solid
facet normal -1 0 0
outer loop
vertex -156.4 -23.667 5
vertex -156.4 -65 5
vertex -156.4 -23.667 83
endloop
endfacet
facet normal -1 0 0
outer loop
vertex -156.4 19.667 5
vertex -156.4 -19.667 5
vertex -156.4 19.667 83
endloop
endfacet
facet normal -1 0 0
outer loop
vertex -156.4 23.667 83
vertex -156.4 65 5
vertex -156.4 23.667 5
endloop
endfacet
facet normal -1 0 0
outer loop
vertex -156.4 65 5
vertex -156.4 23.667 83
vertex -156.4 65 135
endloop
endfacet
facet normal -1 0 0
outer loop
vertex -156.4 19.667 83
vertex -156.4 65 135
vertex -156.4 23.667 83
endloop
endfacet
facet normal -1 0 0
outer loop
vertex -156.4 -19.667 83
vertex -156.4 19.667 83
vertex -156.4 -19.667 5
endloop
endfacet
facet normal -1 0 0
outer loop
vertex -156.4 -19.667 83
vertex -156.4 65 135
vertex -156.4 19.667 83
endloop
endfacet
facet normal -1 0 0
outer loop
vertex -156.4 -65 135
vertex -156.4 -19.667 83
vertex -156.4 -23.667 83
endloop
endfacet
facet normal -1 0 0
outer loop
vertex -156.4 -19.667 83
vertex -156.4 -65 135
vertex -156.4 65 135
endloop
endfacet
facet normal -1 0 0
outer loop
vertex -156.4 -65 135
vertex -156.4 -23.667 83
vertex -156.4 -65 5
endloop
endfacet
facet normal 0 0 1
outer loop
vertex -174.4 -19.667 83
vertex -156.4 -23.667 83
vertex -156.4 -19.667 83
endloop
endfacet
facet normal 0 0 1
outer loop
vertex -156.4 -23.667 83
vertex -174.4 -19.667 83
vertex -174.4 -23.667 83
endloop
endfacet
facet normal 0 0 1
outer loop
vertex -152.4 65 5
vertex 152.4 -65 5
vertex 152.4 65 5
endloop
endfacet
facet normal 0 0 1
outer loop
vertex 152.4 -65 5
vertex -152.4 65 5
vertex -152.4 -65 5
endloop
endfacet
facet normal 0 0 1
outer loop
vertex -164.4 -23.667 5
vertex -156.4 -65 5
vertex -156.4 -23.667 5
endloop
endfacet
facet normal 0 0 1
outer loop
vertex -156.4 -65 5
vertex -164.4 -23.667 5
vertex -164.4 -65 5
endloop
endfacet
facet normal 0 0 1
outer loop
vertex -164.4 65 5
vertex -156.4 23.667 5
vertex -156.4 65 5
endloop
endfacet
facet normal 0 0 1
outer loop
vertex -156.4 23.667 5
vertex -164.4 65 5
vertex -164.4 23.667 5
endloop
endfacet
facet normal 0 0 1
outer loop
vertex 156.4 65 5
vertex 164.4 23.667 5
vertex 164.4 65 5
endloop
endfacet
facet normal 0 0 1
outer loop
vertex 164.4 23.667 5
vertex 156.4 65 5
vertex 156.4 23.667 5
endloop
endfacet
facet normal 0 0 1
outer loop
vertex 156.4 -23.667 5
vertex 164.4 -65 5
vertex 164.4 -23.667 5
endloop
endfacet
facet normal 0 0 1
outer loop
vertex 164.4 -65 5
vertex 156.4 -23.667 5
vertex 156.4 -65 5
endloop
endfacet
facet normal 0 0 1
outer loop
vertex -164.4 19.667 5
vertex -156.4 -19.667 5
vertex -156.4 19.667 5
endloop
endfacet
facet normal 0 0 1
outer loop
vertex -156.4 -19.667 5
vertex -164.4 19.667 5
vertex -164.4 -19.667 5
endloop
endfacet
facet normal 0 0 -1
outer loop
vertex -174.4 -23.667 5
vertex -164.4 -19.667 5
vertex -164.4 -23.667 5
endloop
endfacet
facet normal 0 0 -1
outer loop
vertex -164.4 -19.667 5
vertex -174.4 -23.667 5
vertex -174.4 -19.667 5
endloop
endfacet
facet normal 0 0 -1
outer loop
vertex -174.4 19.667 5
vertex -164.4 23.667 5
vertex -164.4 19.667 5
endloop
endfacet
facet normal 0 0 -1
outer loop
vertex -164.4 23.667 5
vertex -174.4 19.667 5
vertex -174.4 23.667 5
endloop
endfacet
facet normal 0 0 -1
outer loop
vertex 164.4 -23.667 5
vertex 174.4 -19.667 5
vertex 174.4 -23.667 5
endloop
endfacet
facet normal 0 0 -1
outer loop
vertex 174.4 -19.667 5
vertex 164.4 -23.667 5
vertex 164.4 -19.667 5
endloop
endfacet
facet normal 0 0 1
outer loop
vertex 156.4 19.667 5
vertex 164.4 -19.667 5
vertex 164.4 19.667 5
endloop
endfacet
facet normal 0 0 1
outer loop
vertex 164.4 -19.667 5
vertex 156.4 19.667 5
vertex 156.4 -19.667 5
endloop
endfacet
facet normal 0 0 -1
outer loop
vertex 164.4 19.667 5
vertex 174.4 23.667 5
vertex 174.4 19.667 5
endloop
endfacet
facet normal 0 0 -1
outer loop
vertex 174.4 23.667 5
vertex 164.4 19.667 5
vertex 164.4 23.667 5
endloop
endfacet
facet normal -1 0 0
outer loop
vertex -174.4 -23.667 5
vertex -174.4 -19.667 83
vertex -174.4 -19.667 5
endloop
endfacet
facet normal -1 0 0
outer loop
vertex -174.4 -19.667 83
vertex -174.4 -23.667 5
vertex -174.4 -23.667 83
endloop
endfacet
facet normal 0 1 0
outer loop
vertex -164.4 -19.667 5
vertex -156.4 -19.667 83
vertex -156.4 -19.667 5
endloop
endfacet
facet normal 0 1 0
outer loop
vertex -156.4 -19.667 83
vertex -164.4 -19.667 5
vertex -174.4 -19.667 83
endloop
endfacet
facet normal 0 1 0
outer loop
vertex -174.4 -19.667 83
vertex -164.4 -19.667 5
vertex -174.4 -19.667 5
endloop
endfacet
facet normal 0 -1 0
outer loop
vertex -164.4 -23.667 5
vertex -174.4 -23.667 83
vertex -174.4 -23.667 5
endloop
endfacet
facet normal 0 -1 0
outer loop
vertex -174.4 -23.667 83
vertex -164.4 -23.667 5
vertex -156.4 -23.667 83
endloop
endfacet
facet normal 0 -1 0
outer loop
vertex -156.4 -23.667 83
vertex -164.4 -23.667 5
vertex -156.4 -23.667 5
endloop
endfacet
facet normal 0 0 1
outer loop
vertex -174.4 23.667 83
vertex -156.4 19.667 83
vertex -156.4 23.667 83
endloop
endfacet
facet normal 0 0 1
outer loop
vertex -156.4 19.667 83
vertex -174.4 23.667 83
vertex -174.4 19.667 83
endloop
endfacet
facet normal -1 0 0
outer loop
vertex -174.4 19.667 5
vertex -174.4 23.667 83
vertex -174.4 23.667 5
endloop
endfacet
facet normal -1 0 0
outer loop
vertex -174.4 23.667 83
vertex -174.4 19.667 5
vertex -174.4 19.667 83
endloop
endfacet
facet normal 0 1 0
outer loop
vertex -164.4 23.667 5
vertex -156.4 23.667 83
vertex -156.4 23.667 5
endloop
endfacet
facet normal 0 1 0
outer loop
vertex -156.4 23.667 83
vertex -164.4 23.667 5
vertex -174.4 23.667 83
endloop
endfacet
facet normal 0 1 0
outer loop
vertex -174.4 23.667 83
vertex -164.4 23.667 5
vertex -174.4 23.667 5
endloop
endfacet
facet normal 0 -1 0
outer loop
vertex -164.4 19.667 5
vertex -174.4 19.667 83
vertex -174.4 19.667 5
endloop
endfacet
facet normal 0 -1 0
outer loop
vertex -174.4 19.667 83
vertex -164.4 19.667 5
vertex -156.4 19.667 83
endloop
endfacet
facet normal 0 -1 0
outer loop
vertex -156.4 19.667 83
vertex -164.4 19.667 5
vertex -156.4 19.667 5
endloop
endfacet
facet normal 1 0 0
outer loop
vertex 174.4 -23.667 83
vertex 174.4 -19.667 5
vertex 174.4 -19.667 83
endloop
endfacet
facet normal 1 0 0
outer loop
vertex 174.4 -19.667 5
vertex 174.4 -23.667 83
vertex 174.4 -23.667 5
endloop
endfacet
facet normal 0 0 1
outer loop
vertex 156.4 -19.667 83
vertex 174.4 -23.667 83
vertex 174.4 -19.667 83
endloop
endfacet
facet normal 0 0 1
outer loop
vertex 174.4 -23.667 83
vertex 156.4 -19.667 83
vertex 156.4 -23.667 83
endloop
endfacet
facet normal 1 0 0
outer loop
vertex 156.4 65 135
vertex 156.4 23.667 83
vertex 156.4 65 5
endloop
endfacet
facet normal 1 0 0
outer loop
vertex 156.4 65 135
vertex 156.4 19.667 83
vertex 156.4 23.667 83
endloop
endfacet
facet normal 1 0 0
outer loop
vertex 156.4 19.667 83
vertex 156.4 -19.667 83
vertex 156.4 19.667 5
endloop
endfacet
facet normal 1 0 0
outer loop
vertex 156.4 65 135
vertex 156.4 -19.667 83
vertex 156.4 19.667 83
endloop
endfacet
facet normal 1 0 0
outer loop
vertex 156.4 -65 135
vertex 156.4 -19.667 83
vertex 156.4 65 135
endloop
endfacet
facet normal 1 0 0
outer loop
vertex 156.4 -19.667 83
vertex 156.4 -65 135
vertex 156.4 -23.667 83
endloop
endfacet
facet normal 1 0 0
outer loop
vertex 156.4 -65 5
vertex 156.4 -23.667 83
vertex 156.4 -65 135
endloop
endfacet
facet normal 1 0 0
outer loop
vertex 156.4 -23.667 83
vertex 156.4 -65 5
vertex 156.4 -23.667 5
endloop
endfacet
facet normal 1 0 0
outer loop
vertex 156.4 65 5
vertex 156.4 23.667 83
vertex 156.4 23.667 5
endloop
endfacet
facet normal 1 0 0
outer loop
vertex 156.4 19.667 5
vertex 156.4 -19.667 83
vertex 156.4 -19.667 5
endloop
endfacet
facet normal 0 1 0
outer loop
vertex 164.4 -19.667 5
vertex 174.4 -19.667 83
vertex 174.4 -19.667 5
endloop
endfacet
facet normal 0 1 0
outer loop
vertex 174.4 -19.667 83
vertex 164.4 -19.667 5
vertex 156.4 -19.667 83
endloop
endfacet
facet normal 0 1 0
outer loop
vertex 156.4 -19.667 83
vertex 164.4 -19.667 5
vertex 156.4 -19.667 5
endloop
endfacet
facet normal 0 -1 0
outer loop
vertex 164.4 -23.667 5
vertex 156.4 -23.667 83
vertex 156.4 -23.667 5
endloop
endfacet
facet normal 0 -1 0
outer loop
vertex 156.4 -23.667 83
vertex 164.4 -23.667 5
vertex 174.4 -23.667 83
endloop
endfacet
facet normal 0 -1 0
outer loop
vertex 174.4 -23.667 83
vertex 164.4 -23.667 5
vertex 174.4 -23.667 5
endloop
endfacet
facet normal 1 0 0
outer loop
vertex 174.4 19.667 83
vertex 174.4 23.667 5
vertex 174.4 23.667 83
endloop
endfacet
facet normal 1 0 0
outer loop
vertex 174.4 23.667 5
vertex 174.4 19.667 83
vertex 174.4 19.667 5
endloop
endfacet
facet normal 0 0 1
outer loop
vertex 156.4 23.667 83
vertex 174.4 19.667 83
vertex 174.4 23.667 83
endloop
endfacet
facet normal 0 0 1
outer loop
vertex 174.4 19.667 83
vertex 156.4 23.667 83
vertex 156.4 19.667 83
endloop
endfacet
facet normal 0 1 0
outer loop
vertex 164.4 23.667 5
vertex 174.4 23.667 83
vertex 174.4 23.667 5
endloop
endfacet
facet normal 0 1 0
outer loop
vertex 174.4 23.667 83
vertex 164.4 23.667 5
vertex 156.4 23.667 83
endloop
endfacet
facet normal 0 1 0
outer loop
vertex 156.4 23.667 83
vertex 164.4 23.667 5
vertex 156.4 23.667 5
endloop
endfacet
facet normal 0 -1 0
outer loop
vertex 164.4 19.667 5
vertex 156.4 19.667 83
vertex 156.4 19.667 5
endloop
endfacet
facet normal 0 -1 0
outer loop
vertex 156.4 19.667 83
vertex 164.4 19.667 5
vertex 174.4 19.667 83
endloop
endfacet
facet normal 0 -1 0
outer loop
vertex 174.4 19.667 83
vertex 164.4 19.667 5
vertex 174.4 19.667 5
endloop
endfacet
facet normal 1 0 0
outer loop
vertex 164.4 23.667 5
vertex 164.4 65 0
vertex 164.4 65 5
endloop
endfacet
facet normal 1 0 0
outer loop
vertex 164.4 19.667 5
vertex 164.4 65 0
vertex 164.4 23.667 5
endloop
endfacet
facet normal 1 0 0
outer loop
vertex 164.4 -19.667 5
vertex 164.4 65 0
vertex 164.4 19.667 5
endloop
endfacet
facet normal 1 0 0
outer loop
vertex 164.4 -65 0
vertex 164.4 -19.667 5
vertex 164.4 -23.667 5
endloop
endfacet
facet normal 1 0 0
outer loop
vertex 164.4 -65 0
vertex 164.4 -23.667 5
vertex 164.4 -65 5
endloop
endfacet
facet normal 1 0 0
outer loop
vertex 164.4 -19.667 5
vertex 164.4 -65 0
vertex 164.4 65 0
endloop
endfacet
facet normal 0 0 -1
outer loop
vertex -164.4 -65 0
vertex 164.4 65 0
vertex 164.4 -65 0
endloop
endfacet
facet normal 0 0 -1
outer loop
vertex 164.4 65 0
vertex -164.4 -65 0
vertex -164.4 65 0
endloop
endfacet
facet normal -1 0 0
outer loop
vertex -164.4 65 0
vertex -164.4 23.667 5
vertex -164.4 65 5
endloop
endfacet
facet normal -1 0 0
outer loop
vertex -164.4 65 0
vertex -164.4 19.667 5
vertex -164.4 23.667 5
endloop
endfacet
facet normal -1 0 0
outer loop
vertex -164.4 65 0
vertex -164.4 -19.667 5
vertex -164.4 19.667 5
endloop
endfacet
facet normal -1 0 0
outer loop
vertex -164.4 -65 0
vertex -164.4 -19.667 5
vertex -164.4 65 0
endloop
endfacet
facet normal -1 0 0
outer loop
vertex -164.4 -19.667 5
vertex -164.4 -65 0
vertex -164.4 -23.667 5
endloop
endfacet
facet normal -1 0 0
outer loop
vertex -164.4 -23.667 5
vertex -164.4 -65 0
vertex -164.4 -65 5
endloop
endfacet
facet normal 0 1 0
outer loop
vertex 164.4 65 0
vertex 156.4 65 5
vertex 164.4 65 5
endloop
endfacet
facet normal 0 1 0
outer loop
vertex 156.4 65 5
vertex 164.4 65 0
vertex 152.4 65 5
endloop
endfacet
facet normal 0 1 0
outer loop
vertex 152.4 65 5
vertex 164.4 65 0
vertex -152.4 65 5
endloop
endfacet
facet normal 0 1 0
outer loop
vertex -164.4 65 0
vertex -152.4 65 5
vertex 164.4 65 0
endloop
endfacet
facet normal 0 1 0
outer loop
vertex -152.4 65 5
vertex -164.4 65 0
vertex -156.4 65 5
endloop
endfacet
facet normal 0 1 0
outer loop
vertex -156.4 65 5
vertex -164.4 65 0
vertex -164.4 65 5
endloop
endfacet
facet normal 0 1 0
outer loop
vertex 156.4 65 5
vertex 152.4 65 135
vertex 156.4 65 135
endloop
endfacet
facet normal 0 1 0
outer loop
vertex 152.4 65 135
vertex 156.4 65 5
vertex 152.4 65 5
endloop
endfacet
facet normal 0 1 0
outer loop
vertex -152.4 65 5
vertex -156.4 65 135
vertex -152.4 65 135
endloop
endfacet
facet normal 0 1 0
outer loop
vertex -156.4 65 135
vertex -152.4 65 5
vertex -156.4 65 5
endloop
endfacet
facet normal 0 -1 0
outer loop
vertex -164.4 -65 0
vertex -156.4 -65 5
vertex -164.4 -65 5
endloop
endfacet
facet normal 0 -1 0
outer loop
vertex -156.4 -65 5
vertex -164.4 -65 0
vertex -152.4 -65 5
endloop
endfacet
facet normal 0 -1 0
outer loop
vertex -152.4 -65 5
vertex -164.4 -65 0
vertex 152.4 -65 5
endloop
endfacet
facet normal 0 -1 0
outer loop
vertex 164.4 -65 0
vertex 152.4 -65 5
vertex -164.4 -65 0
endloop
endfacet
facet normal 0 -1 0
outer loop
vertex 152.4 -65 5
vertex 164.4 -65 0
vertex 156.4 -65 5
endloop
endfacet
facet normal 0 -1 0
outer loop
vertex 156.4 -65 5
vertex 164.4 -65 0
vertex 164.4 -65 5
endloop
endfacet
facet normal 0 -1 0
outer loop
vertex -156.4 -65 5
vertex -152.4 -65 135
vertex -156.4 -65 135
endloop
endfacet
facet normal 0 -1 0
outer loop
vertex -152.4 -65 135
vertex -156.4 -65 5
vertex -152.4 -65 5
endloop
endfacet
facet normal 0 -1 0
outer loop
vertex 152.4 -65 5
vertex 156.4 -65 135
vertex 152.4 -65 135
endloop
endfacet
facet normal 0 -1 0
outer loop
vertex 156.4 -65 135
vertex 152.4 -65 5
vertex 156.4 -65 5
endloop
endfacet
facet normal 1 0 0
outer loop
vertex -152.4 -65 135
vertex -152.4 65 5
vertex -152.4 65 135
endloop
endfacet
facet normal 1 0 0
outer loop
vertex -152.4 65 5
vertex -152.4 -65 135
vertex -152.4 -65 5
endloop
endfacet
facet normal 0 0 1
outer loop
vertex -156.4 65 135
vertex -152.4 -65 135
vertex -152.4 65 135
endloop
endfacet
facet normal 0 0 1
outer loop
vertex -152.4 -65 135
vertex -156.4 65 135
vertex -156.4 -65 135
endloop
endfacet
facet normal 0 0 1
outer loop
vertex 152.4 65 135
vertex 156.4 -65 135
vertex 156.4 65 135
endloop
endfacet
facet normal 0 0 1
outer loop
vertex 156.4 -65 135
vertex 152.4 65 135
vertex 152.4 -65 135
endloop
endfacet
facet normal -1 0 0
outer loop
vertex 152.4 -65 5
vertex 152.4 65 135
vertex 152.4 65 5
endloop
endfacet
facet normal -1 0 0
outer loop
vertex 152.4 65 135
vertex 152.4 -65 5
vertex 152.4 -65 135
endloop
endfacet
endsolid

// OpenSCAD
// =============================================================================
// calibration_jig.scad — Parametric calibration jig for dual-camera eye tracker
// =============================================================================
//
// PURPOSE
//   Holds two flat ArUco-marker panels at a mechanically-known relative pose.
//   A downstream solver uses this fixed inter-panel transform to compute the
//   extrinsic between the headset's eye camera and scene camera (which cannot
//   both see the same target).
//
// GEOMETRY
//   U-shaped jig. Two parallel marker panels rise from a horizontal base.
//   Headset sits on the base between the panels. Eye cam sees Panel A's
//   inner face; scene cam sees Panel B's inner face.
//
//   Side profile:                    Top-down:
//       |       |                       | ----- |
//       |  HS   |                       |  HS   |
//       |_______|                       | ----- |
//   Panel A   Panel B                Panel A   Panel B
//
// COORDINATE FRAME (used by marker_positions.json)
//   Origin: midpoint of base top surface, between the two panel inner faces.
//   +X: from Panel A toward Panel B (along the inter-panel separation).
//   +Y: lateral, along panel width.
//   +Z: up (vertical).
//   Panel A inner face is at x = -panel_separation_x/2, normal = +X.
//   Panel B inner face is at x = +panel_separation_x/2, normal = -X.
//
// RENDER / EXPORT
//   Open in OpenSCAD (use a recent development snapshot — the 2021.01 stable
//   is stale): F5 = preview, F6 = full render, File > Export > STL.
//   The red marker outlines use OpenSCAD's `%` background modifier — they
//   appear in F5 preview only and are automatically excluded from F6
//   render and STL export. show_marker_outlines just toggles their
//   visibility in preview; it can't affect the print.
//
// SIDECAR MARKER POSITIONS
//   Run `python3 generate_marker_positions.py` to produce marker_positions.json.
//   That script parses the parameter values below directly from this file, so
//   keep all parameter declarations as simple `name = value;` lines.
//
// PRINTING
//   - Print upright on the base. Both panel inner faces are vertical during
//     the print. Use 0.15 mm layers and a slow first layer.
//   - Paper ArUco markers stick to the inner faces after printing. The plastic
//     is a reference plane, not the optical feature — layer texture under the
//     sticker doesn't affect detection.
//   - A brim helps adhesion on the tall walls.
// =============================================================================

// ---- PARAMETERS (simple `name = value;` lines — parsed by Python sidecar) ----

// Inter-panel geometry (mm)
panel_separation_x = 304.8;   // 12 in — between panel inner faces (~146 mm working distance per camera)
panel_width        = 130;     // along Y (lateral) — sized so a 3x3 grid of marker_size fits without overlap
panel_height       = 130;     // along Z (vertical)
panel_thickness    = 4;

// Base (connects the two panels)
base_thickness     = 5;
base_overhang      = 8;       // base extends past panel outer faces by this

// Stiffening ribs on the OUTSIDE of each panel (don't intrude on marker face)
rib_count          = 2;
rib_thickness      = 4;
rib_depth          = 18;      // how far the rib extends outward from panel
rib_height_frac    = 0.6;     // rib height as fraction of panel_height

// Marker slot layout — parametric starting point. Edit if you want a different
// grid; the sidecar JSON regenerates from these values. Sized so the eye cam
// (the lower-resolution of the two) resolves markers comfortably — the scene
// cam handles this size trivially.
marker_size        = 30;      // ArUco marker edge (mm), same on both panels
marker_grid_cols   = 3;       // markers along Y
marker_grid_rows   = 3;       // markers along Z
marker_margin      = 6;       // panel-edge → outer marker edge (mm)

// Visualization toggle (preview only; geometry is `%`-marked so it's never
// included in F6 render or STL export regardless of this setting)
show_marker_outlines = 1;

// ---- END PARAMETERS ----

$fn = 64;

// Derived helpers
base_length_x = panel_separation_x + 2 * panel_thickness + 2 * base_overhang;
base_width_y  = panel_width;

module base_plate() {
    translate([-base_length_x/2, -base_width_y/2, 0])
        cube([base_length_x, base_width_y, base_thickness]);
}

module marker_panel(side) {
    // side = -1 for Panel A, +1 for Panel B
    inner_face_x = side * panel_separation_x / 2;
    outer_face_x = inner_face_x + side * panel_thickness;
    x_lo = min(inner_face_x, outer_face_x);
    translate([x_lo, -panel_width/2, base_thickness])
        cube([panel_thickness, panel_width, panel_height]);
}

module rib(side, i) {
    inner_face_x = side * panel_separation_x / 2;
    outer_face_x = inner_face_x + side * panel_thickness;
    y_step   = panel_width / (rib_count + 1);
    y_center = -panel_width/2 + (i + 1) * y_step;
    rib_x = (side == 1) ? outer_face_x : outer_face_x - rib_depth;
    translate([rib_x, y_center - rib_thickness/2, base_thickness])
        cube([rib_depth, rib_thickness, panel_height * rib_height_frac]);
}

// Visualization only — thin rectangles on each panel's inner face showing
// where ArUco stickers go. Called with `%` from the bottom of the file so
// this geometry is preview-only (excluded from F6 render and STL export).
module marker_outlines() {
    x_thin = 0.2;
    color([0.9, 0.2, 0.2, 0.85])
    for (side = [-1, 1]) {
        inner_face_x = side * panel_separation_x / 2;
        y_span = panel_width - 2 * marker_margin - marker_size;
        z_min  = base_thickness + marker_margin + marker_size/2;
        z_max  = base_thickness + panel_height - marker_margin - marker_size/2;
        for (ci = [0 : marker_grid_cols - 1])
            for (ri = [0 : marker_grid_rows - 1]) {
                y_c = (marker_grid_cols > 1)
                    ? -y_span/2 + ci * y_span / (marker_grid_cols - 1)
                    : 0;
                z_c = (marker_grid_rows > 1)
                    ? z_min + ri * (z_max - z_min) / (marker_grid_rows - 1)
                    : (z_min + z_max) / 2;
                // place the slab on the inner-facing side of the panel
                x_slab = (side == 1) ? inner_face_x - x_thin : inner_face_x;
                translate([x_slab, y_c - marker_size/2, z_c - marker_size/2])
                    cube([x_thin, marker_size, marker_size]);
            }
    }
}

module assembly() {
    base_plate();
    marker_panel(-1);
    marker_panel(+1);
    for (s = [-1, 1])
        for (i = [0 : rib_count - 1])
            rib(s, i);
}

assembly();
// % makes marker_outlines preview-only — never in F6 render or STL.
if (show_marker_outlines) %marker_outlines();
